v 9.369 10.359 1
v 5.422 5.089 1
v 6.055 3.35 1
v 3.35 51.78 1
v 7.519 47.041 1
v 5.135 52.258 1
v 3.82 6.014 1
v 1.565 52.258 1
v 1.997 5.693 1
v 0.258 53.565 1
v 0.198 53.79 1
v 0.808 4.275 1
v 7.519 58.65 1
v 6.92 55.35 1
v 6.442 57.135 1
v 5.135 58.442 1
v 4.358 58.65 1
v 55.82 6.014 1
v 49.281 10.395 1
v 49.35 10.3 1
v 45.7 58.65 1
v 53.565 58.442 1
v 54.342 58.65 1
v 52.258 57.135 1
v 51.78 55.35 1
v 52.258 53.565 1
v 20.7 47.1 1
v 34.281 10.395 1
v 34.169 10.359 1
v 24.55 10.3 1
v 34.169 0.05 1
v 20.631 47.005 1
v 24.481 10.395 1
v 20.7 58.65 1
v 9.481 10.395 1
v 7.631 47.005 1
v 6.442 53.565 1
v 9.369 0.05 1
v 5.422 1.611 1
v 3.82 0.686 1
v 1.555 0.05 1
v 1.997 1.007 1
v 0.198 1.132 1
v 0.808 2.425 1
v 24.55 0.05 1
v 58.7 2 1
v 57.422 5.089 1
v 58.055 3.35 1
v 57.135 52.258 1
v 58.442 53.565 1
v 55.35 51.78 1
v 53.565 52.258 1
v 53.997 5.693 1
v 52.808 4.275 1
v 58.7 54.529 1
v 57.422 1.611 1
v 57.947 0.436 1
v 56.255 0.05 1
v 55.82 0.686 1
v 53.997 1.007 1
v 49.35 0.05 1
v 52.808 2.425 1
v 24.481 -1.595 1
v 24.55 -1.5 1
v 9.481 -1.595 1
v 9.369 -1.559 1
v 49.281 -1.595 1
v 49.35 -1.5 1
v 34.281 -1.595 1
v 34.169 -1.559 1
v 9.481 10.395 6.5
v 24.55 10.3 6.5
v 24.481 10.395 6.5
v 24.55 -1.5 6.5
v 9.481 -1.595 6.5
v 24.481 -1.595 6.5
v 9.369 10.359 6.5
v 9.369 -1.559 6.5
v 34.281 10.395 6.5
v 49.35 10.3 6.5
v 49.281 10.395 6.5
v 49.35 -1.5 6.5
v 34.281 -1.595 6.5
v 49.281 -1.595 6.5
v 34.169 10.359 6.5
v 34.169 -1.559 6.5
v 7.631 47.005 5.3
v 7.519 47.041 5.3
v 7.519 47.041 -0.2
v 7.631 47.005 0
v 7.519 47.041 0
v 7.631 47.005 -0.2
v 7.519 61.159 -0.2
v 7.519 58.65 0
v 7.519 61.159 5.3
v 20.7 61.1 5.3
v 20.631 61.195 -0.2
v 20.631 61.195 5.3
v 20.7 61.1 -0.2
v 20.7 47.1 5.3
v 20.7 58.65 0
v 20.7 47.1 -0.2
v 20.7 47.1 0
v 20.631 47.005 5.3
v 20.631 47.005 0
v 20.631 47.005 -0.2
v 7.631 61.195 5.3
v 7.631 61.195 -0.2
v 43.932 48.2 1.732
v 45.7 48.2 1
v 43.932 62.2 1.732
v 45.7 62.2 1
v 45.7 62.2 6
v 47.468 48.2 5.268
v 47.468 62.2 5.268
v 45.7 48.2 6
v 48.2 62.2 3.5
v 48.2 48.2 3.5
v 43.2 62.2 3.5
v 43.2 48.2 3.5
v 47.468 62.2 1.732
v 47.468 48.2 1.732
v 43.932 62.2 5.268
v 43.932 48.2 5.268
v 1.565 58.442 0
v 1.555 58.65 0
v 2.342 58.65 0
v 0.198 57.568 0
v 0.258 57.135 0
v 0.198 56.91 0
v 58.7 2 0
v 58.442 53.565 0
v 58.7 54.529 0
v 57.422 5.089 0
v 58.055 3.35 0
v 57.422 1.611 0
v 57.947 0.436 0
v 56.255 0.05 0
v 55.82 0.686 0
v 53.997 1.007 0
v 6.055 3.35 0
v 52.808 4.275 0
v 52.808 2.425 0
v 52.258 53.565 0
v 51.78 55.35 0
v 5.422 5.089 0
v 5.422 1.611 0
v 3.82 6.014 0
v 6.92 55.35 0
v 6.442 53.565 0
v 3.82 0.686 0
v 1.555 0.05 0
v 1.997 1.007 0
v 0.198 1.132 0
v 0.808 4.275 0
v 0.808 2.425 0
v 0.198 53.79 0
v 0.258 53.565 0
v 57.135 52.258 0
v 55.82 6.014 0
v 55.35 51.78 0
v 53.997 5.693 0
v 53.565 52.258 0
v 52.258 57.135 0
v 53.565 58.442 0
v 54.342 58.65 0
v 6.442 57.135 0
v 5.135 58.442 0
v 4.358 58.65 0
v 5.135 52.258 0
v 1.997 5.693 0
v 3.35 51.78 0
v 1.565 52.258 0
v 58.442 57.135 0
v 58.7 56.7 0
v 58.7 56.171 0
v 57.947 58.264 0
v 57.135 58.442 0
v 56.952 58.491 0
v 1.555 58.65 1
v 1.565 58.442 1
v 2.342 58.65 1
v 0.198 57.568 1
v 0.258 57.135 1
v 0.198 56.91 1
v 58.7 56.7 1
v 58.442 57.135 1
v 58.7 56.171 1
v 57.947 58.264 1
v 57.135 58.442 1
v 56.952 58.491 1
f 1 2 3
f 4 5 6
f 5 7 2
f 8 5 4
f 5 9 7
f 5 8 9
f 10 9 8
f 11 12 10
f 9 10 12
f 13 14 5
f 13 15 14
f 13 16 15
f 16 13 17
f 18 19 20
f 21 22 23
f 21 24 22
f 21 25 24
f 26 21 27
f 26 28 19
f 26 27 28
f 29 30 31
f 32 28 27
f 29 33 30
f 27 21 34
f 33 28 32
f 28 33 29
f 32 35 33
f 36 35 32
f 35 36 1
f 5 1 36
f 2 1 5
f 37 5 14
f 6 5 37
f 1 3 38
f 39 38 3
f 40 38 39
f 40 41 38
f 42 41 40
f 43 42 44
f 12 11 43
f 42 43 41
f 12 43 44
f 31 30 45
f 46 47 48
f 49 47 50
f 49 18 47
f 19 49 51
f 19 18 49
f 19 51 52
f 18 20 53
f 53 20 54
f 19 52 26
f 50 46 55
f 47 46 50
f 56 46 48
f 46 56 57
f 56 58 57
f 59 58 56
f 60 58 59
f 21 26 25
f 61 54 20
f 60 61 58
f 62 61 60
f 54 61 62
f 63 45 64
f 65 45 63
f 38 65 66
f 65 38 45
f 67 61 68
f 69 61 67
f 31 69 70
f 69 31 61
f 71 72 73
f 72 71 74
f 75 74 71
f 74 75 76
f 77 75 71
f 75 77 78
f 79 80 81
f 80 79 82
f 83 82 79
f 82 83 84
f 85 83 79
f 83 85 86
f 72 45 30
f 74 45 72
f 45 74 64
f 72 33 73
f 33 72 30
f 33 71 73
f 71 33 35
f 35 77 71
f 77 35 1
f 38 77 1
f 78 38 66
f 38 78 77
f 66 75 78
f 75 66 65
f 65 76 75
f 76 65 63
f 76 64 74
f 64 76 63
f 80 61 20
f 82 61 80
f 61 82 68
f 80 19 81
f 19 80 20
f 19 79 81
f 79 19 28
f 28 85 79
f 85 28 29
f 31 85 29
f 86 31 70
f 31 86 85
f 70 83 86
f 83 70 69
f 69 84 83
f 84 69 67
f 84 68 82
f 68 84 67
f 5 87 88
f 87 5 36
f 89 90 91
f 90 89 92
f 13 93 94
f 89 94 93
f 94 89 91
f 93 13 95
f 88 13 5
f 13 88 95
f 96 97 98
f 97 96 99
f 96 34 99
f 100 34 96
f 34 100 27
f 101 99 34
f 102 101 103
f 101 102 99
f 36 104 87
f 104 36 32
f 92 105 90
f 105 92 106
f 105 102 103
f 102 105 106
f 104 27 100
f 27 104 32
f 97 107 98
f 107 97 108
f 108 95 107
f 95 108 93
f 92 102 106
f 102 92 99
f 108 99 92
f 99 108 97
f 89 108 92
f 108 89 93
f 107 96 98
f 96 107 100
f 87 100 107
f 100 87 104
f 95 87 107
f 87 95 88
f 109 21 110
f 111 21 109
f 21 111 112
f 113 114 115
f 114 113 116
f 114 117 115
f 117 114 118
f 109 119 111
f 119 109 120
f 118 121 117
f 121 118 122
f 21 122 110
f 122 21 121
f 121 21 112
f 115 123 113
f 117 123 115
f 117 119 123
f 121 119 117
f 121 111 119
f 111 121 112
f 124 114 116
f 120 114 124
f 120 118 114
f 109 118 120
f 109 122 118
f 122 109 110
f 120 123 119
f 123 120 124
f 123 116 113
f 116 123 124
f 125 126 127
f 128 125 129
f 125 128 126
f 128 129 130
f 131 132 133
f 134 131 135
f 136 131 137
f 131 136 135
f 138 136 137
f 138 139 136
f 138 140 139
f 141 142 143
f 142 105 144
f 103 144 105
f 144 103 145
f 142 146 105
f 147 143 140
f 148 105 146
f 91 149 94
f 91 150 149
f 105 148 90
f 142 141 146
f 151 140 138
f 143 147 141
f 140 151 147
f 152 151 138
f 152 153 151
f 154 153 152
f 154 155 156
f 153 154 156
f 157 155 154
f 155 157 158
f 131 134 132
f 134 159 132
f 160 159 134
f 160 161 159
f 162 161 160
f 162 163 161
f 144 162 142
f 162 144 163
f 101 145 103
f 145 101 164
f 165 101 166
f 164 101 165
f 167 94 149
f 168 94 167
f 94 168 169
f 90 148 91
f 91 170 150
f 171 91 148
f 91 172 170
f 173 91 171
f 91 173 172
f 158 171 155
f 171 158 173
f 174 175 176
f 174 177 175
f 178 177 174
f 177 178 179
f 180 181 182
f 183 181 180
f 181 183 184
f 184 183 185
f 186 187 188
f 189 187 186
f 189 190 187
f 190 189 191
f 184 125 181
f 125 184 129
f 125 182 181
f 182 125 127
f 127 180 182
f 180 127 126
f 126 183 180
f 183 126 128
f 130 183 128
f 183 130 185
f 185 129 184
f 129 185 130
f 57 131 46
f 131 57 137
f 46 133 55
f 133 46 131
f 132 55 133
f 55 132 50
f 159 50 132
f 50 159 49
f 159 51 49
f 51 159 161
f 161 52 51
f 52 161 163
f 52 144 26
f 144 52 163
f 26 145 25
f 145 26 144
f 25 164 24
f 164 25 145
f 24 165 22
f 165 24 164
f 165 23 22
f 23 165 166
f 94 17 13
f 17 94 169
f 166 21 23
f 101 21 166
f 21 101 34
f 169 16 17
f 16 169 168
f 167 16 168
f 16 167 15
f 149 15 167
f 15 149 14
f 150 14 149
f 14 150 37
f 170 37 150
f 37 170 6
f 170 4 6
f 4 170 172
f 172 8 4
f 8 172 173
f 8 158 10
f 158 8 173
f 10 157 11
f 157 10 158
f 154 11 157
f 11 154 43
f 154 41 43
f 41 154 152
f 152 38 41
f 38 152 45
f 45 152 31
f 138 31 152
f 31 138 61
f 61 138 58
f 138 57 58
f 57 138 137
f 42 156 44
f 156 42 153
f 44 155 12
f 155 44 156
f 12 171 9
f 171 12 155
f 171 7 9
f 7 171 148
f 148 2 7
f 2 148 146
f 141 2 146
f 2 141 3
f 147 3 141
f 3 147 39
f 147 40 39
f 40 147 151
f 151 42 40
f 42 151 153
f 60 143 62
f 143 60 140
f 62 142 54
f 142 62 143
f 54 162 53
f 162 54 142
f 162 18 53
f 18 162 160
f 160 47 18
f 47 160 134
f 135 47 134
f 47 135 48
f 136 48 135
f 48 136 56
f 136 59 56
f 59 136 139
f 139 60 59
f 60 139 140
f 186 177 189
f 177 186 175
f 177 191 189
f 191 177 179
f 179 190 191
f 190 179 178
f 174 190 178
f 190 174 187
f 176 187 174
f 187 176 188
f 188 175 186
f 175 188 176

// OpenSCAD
// file: nuts.scad
module rrect(w,l,r) {
    translate([r,r,0]) {
        minkowski() {
            square(size = [w-(2*r), l-(2*r)]);
            circle(r=r);
        }
    }
}

module nuthole_m2() {
    // circle(d=2.1);
    circle(d=30);
}

module nuthole_m25() {
    // circle(d=2.6);
    circle(d=30);
}

module nuthole_m3() {
    // circle(d=3.15);
    circle(d=30);
}

module nuthole_m4() {
    // circle(d=4.2);
    circle(d=30);
}

module hole_for_standoff_m3_2mm() {
    circle(d=5.41);
}

module hole_for_standoff_m4_6mm() {
    circle(d=7.14);
}

module hole_for_standoff_m3_4mm() {
    circle(d=5.41);
}

module hole_for_standoff_m3_6mm() {
    circle(d=5.41);
}

module hole_for_standoff_m25_2mm() {
    circle(d=3);
}

module hole_for_threaded_pin_m3_8mm() {
    circle(d=3);
}
// main file
use <nuts.scad>

hdmi_hole_half_dist = 52 / 2;
hdmi_main_square = 58.7;
hdmi_centre = hdmi_main_square / 2;

module hdmi_holes() {
    margin = hdmi_centre - hdmi_hole_half_dist;
    far = hdmi_centre + hdmi_hole_half_dist;

    translate([margin,far,0]) hole_for_standoff_m4_6mm();
    translate([far,far,0]) hole_for_standoff_m4_6mm();

    // make front holes M3 since theire is no space for M4
    // hope that if back holes are screwed in first, the
    // hagibis will not move around too much
    translate([margin,margin,0]) hole_for_standoff_m3_6mm();
    translate([far,margin,0]) hole_for_standoff_m3_6mm();
}

module hdmi_connectors() {
    hdmi_conn_w = 15.2;
    usb_conn_w = 13.2;

    union() {
        linear_extrude(5.5)
        union() {
            translate([hdmi_centre - 20, -1.6, 0])
            rrect(hdmi_conn_w, 12, 0.1);
            translate([hdmi_centre + 20 - hdmi_conn_w, -1.6, 0])
            rrect(hdmi_conn_w, 12, 0.1);
        }

        translate([0, 0, -1.2])
        linear_extrude(5.5)
        union() {
            translate([7.5, 47, 0])
            rrect(usb_conn_w, 14.2, 0.1);
        }

        translate([hdmi_main_square - 13, hdmi_main_square + 3.5, 2.5])
        rotate([90, 0, 0])
        linear_extrude(14)
        circle(r=2.5);
    }
}

module hdmi() {
    brd_thickness = 1;
    // TODO: proper hole positions
    union() {
        color("gray") translate([0, 0, brd_thickness]) hdmi_connectors();
        linear_extrude(brd_thickness)
        difference() {
            rrect(hdmi_main_square, hdmi_main_square,2);
            hdmi_holes();
        }
    }
}

hdmi();
